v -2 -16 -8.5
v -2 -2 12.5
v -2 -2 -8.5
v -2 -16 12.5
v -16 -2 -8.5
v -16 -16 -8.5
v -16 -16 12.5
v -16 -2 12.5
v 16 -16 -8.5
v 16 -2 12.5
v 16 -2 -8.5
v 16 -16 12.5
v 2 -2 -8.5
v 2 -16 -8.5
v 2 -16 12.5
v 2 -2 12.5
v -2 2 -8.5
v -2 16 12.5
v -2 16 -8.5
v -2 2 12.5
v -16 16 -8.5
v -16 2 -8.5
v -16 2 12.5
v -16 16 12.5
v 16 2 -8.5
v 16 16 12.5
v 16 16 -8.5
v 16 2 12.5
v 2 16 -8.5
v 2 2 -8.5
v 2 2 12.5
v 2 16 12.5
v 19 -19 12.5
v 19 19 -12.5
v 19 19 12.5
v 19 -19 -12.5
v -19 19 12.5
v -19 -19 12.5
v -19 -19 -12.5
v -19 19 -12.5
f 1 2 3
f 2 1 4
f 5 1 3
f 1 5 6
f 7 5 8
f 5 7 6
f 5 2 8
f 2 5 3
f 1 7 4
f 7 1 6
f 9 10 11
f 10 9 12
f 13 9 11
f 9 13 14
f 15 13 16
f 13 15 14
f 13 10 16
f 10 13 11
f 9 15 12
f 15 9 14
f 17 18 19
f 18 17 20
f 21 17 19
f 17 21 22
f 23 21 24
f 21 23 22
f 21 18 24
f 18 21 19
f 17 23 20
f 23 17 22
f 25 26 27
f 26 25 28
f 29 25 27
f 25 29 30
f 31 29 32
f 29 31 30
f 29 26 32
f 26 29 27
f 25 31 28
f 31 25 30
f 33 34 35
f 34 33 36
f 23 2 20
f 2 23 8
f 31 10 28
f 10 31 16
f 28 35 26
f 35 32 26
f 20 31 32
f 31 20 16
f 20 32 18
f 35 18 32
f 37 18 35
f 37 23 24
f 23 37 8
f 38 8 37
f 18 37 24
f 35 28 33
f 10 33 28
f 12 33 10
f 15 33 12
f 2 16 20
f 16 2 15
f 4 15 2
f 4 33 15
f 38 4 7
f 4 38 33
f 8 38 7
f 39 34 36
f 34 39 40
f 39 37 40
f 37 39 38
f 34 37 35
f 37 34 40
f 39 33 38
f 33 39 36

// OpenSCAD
$fn = 32;

// ----------------------------------------------------------------------
// Pocket plate 38 x 38 x 25
// 2 x 2 pockets 14 mm square, 21 mm deep
// ----------------------------------------------------------------------

// --- parameters (mm) ---
thickness = 25;  // plate thickness
floor_t = 4;     // material left under each pocket
pocket = 14;     // pocket side length
pitch_x = 18;    // pocket pitch along X
pitch_y = 18;    // pocket pitch along Y
cols = 2;        // pockets per row
rows = 2;        // rows of pockets

// --- derived feature positions (mm) ---
depth = thickness - floor_t;        // = 21   pocket depth, down to the floor
span_x = (cols - 1) * pitch_x;      // = 18   distance between outer pockets
span_y = (rows - 1) * pitch_y;      // = 18   distance between outer pocket rows
origin_x = -span_x / 2;             // = -9   X of the first pocket
origin_y = -span_y / 2;             // = -9   Y of the first pocket
plate = [span_x + pocket + 6, span_y + pocket + 6, thickness];  // = [38, 38, 25]   overall size: pockets plus 3 mm of wall on each side
feature_centers = [
  [origin_x + 0 * pitch_x, origin_y + 0 * pitch_y],
  [origin_x + 1 * pitch_x, origin_y + 0 * pitch_y],
  [origin_x + 0 * pitch_x, origin_y + 1 * pitch_y],
  [origin_x + 1 * pitch_x, origin_y + 1 * pitch_y]
];   // pocket centres, used verbatim by the cutter loop

// plate outline, then one pocket per centre in feature_centers
difference() {
  cube(plate, center = true);
  for (centre = feature_centers)
    translate([centre[0] - pocket / 2, centre[1] - pocket / 2, plate[2] / 2 - depth])
      cube([pocket, pocket, depth + 1]);  // centred on the declared pocket centre
}
